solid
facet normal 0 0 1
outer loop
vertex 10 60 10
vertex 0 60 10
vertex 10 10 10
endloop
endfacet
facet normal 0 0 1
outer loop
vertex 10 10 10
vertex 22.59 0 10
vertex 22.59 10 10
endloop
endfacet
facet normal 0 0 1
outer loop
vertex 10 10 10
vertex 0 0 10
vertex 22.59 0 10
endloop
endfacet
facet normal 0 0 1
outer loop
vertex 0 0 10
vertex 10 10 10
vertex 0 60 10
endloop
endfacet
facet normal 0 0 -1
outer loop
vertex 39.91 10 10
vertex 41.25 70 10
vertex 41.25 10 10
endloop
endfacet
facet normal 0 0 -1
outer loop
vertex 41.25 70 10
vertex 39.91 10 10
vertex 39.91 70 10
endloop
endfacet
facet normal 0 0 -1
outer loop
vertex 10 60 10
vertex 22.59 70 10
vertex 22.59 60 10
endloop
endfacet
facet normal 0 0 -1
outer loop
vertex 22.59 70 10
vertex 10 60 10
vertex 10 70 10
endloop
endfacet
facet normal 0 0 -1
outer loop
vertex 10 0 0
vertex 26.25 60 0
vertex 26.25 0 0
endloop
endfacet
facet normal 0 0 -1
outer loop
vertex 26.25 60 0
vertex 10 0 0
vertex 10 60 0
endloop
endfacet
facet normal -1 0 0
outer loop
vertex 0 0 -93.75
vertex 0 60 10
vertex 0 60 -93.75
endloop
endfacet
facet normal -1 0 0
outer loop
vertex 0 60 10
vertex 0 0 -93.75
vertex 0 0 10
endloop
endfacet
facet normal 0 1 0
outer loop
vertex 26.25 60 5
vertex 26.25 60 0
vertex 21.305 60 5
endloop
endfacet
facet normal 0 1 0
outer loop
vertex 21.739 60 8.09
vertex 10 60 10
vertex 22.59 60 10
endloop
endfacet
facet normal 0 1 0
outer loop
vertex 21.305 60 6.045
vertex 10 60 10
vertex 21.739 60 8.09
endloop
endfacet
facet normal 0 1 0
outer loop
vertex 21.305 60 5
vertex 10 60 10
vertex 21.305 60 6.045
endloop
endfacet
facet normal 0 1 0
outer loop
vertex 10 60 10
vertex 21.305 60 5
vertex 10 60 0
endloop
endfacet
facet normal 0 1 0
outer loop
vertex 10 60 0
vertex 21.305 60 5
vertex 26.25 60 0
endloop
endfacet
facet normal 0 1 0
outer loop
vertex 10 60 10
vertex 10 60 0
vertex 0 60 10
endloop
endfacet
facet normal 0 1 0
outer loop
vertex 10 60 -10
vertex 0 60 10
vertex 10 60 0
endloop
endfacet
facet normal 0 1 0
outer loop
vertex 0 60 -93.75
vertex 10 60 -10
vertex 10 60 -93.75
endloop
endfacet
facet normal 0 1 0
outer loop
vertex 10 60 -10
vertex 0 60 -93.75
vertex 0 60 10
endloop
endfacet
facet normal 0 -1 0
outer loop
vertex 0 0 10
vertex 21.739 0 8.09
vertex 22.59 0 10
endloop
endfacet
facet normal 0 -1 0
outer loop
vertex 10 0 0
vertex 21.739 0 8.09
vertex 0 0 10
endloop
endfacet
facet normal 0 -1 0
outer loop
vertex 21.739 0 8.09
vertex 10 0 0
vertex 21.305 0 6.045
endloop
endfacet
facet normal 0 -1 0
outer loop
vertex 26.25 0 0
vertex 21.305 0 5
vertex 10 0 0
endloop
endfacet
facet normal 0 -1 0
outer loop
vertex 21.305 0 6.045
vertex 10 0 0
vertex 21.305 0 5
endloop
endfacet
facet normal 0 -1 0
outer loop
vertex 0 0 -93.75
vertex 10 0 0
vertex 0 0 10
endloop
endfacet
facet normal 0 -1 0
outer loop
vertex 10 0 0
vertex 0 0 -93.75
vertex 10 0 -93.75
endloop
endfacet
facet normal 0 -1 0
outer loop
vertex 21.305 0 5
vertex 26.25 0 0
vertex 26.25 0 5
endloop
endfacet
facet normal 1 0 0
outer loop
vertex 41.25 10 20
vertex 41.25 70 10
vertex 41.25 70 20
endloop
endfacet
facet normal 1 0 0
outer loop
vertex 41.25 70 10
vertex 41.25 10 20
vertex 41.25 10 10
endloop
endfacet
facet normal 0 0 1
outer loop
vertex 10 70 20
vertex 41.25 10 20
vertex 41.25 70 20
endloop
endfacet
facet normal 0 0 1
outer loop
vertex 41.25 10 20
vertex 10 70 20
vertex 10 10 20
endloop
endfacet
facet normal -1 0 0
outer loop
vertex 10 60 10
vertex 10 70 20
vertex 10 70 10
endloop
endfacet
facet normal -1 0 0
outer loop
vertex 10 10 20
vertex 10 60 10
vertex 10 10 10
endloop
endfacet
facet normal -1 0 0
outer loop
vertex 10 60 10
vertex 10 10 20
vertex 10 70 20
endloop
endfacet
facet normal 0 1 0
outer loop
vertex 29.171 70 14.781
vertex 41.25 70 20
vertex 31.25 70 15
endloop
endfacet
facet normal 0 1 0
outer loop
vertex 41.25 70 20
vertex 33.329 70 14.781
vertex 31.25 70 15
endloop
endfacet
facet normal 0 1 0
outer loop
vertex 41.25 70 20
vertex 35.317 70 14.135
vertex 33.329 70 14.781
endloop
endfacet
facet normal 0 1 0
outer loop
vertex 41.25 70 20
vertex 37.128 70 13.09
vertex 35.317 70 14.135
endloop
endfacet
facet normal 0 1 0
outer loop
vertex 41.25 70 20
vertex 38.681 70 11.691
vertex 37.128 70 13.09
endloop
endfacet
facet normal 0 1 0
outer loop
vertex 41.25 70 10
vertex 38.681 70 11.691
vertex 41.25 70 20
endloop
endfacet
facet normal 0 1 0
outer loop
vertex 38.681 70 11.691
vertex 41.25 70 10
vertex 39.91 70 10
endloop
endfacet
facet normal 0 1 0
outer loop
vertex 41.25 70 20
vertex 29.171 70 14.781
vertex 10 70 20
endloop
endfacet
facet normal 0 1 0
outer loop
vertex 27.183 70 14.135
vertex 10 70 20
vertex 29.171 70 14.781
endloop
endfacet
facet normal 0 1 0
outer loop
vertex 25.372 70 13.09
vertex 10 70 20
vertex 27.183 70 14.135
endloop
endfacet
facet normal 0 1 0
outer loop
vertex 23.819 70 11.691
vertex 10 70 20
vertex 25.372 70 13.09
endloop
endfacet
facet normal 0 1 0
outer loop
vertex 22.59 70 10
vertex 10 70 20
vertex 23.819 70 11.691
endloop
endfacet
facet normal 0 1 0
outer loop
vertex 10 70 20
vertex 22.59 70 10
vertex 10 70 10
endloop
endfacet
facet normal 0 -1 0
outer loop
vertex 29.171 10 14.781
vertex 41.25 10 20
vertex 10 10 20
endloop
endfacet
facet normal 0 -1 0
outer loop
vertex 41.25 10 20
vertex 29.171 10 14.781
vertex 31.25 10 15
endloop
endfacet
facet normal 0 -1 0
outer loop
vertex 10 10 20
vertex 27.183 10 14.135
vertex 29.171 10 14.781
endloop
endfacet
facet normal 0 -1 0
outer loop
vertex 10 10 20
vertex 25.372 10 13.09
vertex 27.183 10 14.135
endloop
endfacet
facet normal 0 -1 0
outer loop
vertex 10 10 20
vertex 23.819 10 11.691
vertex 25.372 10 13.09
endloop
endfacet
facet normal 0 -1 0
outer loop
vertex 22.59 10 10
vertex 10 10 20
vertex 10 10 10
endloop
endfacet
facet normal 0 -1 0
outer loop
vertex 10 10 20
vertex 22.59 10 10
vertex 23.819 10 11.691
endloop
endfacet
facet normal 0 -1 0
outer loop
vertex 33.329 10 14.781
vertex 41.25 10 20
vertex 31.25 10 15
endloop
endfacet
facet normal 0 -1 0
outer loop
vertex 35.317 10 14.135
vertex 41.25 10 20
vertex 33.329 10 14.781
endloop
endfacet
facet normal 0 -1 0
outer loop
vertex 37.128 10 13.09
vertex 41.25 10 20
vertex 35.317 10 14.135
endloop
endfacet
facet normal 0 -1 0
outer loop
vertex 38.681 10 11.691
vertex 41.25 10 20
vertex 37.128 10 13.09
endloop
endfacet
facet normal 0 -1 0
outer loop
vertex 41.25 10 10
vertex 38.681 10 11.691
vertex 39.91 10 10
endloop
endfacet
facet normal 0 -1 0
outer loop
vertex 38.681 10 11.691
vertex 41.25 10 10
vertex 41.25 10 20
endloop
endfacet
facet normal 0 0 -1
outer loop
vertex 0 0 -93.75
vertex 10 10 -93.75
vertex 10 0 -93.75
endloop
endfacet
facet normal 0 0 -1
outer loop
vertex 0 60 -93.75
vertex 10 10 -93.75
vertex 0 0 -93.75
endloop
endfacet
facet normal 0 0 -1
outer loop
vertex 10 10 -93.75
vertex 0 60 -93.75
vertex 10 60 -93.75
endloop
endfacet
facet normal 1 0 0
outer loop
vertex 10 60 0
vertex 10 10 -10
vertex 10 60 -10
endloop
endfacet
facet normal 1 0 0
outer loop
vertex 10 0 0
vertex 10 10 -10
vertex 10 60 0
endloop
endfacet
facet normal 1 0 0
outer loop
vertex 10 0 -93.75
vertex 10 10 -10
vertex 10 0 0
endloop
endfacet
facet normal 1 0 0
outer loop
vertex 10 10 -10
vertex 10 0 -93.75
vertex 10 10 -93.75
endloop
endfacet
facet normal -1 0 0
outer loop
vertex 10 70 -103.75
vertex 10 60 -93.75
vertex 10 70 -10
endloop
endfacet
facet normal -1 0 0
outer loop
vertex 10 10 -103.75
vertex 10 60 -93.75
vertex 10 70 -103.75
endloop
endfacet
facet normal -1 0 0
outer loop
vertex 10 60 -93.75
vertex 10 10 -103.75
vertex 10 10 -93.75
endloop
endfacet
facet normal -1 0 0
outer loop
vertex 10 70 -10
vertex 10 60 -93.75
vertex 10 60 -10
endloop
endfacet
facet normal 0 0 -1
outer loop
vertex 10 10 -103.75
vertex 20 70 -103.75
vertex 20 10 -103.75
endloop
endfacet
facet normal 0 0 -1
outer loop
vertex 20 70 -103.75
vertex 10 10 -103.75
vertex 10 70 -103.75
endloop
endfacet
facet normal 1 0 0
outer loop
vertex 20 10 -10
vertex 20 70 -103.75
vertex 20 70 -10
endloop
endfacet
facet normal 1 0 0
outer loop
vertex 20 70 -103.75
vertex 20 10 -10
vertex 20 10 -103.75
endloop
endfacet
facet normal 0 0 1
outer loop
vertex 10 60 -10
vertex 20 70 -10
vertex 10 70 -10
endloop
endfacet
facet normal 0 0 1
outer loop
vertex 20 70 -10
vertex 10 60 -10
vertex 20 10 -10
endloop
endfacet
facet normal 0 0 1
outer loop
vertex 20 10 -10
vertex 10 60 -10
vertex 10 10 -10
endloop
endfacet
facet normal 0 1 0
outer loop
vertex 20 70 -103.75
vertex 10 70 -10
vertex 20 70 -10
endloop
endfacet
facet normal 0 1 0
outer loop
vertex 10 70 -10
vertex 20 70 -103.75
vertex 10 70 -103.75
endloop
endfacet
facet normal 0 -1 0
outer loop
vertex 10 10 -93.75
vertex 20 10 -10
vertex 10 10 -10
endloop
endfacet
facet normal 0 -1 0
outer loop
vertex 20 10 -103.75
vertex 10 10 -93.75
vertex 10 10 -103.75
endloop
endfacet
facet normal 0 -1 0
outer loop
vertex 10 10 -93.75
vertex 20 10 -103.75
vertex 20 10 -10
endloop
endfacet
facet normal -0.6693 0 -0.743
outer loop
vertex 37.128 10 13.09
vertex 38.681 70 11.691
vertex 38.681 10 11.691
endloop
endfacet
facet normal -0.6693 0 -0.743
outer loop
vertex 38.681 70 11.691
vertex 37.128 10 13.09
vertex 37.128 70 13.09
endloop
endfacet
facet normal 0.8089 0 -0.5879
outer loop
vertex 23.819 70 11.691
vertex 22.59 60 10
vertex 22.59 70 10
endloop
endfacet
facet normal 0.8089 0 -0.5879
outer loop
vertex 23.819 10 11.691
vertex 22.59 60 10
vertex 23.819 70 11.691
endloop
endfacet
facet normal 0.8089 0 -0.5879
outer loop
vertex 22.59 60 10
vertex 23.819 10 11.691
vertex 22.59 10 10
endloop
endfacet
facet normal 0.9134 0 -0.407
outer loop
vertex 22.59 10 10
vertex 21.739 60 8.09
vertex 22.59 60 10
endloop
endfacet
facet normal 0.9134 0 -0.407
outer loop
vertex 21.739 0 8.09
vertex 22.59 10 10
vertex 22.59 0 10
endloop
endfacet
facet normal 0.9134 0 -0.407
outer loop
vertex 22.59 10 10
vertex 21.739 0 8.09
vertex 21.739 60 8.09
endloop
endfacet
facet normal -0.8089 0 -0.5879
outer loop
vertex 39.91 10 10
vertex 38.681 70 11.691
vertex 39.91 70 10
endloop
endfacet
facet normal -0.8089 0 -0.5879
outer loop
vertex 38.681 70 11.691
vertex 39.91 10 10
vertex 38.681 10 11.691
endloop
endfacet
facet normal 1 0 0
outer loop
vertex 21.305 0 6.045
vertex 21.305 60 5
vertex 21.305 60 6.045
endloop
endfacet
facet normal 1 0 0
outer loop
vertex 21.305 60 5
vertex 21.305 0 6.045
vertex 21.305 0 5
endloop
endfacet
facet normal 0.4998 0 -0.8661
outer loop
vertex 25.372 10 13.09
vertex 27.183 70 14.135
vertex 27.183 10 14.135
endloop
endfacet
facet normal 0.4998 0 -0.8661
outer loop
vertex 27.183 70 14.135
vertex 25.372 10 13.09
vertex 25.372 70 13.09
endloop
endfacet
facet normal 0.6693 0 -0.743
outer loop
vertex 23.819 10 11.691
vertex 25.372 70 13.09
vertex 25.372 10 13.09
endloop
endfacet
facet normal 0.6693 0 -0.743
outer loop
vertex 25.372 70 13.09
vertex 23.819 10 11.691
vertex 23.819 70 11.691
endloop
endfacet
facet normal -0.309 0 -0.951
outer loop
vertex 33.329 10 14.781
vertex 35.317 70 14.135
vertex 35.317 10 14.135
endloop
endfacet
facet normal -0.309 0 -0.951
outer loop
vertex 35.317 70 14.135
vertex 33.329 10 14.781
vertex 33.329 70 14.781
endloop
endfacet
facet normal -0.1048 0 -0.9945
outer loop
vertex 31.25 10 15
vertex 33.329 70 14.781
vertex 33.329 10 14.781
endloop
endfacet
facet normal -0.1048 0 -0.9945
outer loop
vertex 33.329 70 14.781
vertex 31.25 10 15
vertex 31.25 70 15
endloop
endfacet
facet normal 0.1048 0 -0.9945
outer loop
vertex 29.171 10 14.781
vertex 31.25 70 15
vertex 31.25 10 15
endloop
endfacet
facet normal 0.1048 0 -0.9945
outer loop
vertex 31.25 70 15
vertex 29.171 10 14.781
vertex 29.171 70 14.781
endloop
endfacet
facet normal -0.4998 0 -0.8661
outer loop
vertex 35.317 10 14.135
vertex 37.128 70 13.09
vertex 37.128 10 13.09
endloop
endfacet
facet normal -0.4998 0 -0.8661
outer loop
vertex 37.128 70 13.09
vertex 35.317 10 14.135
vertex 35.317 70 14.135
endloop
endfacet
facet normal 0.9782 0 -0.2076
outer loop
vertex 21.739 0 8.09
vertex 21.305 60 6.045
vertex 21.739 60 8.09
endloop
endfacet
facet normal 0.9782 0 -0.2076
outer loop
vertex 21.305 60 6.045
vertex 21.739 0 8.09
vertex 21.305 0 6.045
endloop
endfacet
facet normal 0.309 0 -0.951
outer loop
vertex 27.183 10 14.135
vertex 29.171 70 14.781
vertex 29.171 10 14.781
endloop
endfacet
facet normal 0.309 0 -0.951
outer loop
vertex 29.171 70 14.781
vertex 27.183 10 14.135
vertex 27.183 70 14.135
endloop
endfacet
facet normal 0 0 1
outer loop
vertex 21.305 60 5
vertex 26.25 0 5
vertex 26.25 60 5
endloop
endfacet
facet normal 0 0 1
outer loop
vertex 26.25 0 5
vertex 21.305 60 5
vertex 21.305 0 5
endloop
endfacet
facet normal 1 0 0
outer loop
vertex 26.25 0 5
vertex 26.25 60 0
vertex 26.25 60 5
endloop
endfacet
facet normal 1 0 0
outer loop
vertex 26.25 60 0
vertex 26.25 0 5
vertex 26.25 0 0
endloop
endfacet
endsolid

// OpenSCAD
// file: fullbrick.scad
module ckey(theh)
{
        halfcylinder(theh);
        translate([5,0,0]) rotate([-90,90,0]) cube([10,10,theh]);
}

module halfcylinder(theh)
{
      difference(){
        rotate([-90,90,0]) cylinder(h=theh,r=10);
        rotate([-90,90,0]) translate([0,-10,-1]) cube([20,20,theh+2]);
      }
}



module basebrick(bh,bl)
{
    cube([bl,bh,10]);
    translate([10,10,10]) cube([bl,bh,10]);
}

module brick(bl,bh)
{   
    difference(){
        basebrick(bh,bl);
        translate([bl*.25,-10,5]) ckey(160);
        translate([bl*.75,-10,5]) ckey(160);
        }
    
}

brick(125,60);
// main file
use <fullbrick.scad>;

module ckey(theh)
{
        halfcylinder(theh);
        translate([5,0,0]) rotate([-90,90,0]) cube([10,10,theh]);
}

module halfcylinder(theh)
{
      difference(){
        rotate([-90,90,0]) cylinder(h=theh,r=10);
        rotate([-90,90,0]) translate([0,-10,-1]) cube([20,20,theh+2]);
      }
}



module basecorner(bh,bl)
{
    cube([bl*.25,bh,10]);
    translate([10,10,10]) cube([bl*.25,bh,10]);
    rotate([0,90,0]) translate([0,0,0]) cube([bl*.75,bh,10]);
    rotate([0,90,0]) translate([10,10,10]) cube([bl*.75,bh,10]);
}

module corner(bl,bh)
{   
    difference(){
        basecorner(bh,bl);
        translate([bl*.25,-10,5]) ckey(160);
        rotate([0,90,0]) %translate([bl*.75,-10,5]) ckey(160);
        }
    
}

corner(125,60);
%translate([125*.25,0,0]) rotate([0,0,0]) brick(125,60);
